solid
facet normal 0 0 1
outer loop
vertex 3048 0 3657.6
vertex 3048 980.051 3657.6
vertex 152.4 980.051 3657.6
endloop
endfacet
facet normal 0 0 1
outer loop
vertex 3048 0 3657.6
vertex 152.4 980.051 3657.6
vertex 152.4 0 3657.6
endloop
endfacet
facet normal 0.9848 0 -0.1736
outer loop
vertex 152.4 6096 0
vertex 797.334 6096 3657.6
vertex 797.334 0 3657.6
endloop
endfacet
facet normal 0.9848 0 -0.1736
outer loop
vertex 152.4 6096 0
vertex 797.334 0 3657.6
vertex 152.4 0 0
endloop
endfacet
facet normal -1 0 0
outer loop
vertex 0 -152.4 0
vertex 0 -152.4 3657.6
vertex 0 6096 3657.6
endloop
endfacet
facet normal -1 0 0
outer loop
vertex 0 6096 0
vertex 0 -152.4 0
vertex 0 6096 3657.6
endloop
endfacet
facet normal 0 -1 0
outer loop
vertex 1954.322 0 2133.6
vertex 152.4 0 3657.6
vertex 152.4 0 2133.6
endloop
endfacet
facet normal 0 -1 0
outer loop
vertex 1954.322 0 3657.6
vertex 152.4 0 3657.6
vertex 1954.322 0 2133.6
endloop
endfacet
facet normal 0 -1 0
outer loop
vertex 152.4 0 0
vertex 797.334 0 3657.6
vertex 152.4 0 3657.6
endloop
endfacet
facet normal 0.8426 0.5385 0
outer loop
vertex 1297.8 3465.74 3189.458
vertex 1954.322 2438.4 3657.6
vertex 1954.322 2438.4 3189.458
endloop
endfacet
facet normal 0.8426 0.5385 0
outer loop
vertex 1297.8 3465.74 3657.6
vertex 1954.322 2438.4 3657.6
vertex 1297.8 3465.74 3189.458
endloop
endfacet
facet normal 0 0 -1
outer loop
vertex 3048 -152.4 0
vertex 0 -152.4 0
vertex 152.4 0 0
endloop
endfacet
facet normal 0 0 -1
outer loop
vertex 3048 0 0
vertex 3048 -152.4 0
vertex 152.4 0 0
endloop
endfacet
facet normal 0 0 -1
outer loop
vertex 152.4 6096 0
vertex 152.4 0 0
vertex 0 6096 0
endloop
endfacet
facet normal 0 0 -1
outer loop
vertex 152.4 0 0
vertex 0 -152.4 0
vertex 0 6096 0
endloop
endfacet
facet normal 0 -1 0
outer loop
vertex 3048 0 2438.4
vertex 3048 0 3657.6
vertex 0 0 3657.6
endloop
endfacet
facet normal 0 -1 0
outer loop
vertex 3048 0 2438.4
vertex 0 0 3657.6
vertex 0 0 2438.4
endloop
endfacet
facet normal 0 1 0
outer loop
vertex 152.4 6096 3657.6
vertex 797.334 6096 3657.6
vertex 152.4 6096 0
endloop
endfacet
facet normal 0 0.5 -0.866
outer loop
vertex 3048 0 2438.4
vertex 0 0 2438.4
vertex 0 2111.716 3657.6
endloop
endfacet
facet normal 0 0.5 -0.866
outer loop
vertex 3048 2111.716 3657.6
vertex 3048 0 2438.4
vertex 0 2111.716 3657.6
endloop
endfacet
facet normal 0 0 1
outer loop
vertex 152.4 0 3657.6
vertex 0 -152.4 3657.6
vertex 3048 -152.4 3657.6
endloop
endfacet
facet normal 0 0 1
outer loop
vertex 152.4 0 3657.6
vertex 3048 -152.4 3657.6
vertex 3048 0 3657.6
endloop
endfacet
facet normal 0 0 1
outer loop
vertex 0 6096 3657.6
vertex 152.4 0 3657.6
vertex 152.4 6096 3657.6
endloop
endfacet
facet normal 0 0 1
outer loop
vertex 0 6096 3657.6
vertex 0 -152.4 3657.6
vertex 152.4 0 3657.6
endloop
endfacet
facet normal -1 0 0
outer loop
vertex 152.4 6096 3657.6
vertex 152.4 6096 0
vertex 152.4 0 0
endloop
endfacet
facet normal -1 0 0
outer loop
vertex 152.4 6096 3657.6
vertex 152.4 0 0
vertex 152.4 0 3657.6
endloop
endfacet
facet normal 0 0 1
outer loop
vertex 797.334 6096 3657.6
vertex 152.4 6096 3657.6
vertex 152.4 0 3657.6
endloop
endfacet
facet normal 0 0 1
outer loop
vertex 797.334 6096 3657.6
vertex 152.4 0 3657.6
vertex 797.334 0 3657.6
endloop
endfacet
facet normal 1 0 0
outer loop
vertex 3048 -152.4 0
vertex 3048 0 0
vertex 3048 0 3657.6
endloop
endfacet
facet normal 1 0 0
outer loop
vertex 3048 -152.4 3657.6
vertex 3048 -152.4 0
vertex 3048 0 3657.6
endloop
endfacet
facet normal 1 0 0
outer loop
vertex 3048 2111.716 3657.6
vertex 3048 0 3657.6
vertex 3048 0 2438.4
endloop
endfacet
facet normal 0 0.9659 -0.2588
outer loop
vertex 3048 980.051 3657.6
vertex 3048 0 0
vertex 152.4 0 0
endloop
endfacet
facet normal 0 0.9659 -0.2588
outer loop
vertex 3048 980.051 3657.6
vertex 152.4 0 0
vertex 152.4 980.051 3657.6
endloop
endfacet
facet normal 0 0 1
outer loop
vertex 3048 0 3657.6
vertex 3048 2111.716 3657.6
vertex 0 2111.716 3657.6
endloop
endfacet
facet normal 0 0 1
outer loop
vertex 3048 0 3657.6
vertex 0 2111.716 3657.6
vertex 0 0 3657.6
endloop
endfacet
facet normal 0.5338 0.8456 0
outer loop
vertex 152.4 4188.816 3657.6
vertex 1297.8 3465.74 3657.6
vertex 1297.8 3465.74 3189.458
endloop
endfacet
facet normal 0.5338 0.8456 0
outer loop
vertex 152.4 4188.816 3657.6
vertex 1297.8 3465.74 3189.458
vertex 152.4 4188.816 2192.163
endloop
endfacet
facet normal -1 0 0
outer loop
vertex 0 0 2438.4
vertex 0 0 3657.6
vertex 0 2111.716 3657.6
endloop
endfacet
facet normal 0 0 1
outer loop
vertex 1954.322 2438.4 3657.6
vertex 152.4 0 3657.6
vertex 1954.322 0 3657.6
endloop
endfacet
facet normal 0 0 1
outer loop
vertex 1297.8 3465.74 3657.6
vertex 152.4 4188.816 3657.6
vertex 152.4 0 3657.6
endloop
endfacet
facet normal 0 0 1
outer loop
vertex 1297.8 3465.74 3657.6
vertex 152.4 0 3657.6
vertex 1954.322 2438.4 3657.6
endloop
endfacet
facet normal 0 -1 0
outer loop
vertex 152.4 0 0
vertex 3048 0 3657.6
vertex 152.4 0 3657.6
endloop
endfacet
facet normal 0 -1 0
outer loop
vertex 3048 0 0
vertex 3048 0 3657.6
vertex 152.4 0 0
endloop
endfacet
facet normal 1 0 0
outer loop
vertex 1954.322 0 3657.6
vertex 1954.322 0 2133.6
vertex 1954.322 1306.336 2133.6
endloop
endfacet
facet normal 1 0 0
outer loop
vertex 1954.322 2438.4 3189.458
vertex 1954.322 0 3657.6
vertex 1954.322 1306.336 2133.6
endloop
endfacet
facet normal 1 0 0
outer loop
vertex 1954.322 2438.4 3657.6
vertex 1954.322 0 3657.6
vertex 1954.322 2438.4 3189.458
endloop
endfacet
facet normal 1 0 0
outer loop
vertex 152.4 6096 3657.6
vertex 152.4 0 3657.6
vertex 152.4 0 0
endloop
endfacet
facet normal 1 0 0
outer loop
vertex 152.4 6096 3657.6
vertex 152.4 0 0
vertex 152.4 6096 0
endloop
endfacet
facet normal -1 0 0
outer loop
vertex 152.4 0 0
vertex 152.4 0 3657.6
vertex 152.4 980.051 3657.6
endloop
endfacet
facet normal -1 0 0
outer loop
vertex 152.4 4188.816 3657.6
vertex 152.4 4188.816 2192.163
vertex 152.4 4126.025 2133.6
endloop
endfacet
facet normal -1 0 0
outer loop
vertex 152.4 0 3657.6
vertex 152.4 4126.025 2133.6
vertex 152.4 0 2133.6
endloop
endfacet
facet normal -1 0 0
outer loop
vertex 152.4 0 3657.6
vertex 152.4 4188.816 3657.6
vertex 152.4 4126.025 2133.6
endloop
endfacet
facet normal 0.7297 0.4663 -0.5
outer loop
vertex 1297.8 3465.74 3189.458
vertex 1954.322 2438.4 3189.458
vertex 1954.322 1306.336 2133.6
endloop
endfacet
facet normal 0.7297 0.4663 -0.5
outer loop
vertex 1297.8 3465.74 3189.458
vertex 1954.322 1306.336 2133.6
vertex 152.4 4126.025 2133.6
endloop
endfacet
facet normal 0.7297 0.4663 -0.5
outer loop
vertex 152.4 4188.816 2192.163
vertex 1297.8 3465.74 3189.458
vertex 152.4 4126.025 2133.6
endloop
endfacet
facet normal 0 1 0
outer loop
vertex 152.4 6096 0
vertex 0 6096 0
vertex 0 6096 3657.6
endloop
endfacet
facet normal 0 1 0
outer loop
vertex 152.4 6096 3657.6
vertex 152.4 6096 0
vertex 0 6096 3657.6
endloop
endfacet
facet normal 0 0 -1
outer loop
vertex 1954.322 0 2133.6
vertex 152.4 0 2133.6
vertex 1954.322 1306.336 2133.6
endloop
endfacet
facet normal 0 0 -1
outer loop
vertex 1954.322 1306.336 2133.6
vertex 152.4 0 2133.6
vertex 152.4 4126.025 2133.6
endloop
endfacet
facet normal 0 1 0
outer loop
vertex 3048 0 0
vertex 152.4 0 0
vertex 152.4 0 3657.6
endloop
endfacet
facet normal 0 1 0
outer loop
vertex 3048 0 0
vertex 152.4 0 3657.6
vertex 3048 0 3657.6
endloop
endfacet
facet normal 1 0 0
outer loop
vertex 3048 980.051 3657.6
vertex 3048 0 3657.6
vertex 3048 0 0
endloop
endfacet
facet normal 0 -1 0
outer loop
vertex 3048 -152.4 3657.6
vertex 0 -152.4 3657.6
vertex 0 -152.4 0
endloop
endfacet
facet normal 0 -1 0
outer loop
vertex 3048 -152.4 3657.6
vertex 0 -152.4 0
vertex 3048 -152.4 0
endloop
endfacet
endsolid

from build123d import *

# Parameters (mm, degrees)
F0_W      = 3048
F0_H      = 3657.6
F1_DEPTH  = 152.4
F2_W      = 6096
F2_H      = 3657.6
F3_DEPTH  = 152.4
F5_DEPTH  = 2895.6
F7_DEPTH  = 1524
F8_SIZE2  = 1055.858172294
F8_SIZE   = 609.6
F10_DEPTH = 6096
F12_DEPTH = 3048


with BuildPart() as f1:
    # F0 (on Front) → F1 (new body)
    with BuildSketch(Plane.XZ):
        with Locations((1524, 1828.8)):
            Rectangle(F0_W, F0_H)
    extrude(amount=F1_DEPTH)

    # F2 (on Right) → F3 (join)
    with BuildSketch(Plane.YZ):
        with Locations((3048, 1828.8)):
            Rectangle(F2_W, F2_H)
    extrude(amount=F3_DEPTH)


with BuildPart() as f5:
    # F4 (on face) → F5 (new body, through all)
    with BuildSketch(Plane.YZ.offset(3048)):
        Polygon((0, 3657.6), (0, 0), (980.0509662361, 3657.6), align=None)
    extrude(amount=-F5_DEPTH)


with BuildPart() as f7:
    # F6 (on face) → F7 (new body)
    with BuildSketch(Plane.XY.offset(3657.6)):
        Polygon((1954.3218483143, 2438.4), (1297.8002407542, 3465.7402643753), (152.4, 4188.8156), (152.4, 0), (1954.3218483143, 0), align=None)
    extrude(amount=-F7_DEPTH)

    # F8
    f8_edges = [f7.edges().sort_by_distance(p)[0] for p in [
        (1626.061045, 2952.070132, 2133.6),
    ]]
    f8_side = f7.faces().sort_by_distance((982.966719, 1787.996346, 2133.6))[0]
    chamfer(f8_edges, length=F8_SIZE, length2=F8_SIZE2, reference=f8_side)


with BuildPart() as f10:
    # F9 (on face) → F10 (new body)
    with BuildSketch(Plane(origin=(0, 6096, 0), x_dir=(-1, 0, 0), z_dir=(0, 1, 0))):
        Polygon((-797.3335646393, 3657.6), (-152.4, 0), (-152.4, 3657.6), align=None)
    extrude(amount=-F10_DEPTH)


with BuildPart() as f12:
    # F11 (on face) → F12 (new body)
    with BuildSketch(Plane.YZ.offset(3048)):
        Polygon((2111.716344588, 3657.6), (0, 3657.6), (0, 2438.4), align=None)
    extrude(amount=-F12_DEPTH)


solid = Compound([f1.part, f5.part, f7.part, f10.part, f12.part])
